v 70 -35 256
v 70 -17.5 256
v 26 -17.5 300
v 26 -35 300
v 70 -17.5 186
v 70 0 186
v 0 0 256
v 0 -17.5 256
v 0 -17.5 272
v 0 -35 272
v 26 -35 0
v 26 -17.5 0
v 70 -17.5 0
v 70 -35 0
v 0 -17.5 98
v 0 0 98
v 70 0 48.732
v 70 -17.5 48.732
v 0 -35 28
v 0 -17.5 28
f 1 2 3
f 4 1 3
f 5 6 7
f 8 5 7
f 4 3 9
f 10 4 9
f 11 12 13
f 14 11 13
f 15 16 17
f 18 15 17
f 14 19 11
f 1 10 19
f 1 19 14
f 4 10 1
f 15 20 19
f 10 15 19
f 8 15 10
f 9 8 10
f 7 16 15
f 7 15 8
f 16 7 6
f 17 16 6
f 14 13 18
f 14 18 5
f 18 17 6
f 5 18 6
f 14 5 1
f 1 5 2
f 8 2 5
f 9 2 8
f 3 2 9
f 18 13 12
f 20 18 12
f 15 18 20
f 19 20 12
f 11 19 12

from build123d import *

# Parameters (mm, degrees)
F0_W     = 70
F0_H     = 300
F1_DEPTH = 35
F3_DEPTH = 35.001
F6_DEPTH = 17.5
F8_DEPTH = 35.001
F9_DEPTH = 17.5


with BuildPart() as f1:
    # F0 (on Front) → F1 (new body)
    with BuildSketch(Plane.XZ):
        with Locations((35, 150)):
            Rectangle(F0_W, F0_H)
    extrude(amount=F1_DEPTH)

    # F2 (on face) → F3 (cut, through all)
    with BuildSketch(Plane(origin=(0, 0, 0), x_dir=(-1, 0, 0), z_dir=(0, 1, 0))):
        Polygon((-26, 300), (-70, 300), (-70, 256), align=None)
        Polygon((0, 300), (-26, 300), (0, 272), align=None)
    extrude(amount=-F3_DEPTH, mode=Mode.SUBTRACT)

    # F5 (on face) → F6 (cut)
    with BuildSketch(Plane(origin=(0, 0, 0), x_dir=(-1, 0, 0), z_dir=(0, 1, 0))):
        Polygon((-70, 256), (-70, 186), (0, 256), (0, 272), (-26, 300), align=None)
    extrude(amount=-F6_DEPTH, mode=Mode.SUBTRACT)

    # F7 (on face) → F8 (cut, through all)
    with BuildSketch(Plane(origin=(0, 0, 0), x_dir=(-1, 0, 0), z_dir=(0, 1, 0))):
        Polygon((0, 0), (0, 28), (-26, 0), align=None)
    extrude(amount=-F8_DEPTH, mode=Mode.SUBTRACT)

    # F7 (on face) → F9 (cut)
    with BuildSketch(Plane(origin=(0, 0, 0), x_dir=(-1, 0, 0), z_dir=(0, 1, 0))):
        Polygon((0, 98), (-70, 48.732314), (-70, 0), (-26, 0), (0, 28), align=None)
    extrude(amount=-F9_DEPTH, mode=Mode.SUBTRACT)


solid = f1.part
